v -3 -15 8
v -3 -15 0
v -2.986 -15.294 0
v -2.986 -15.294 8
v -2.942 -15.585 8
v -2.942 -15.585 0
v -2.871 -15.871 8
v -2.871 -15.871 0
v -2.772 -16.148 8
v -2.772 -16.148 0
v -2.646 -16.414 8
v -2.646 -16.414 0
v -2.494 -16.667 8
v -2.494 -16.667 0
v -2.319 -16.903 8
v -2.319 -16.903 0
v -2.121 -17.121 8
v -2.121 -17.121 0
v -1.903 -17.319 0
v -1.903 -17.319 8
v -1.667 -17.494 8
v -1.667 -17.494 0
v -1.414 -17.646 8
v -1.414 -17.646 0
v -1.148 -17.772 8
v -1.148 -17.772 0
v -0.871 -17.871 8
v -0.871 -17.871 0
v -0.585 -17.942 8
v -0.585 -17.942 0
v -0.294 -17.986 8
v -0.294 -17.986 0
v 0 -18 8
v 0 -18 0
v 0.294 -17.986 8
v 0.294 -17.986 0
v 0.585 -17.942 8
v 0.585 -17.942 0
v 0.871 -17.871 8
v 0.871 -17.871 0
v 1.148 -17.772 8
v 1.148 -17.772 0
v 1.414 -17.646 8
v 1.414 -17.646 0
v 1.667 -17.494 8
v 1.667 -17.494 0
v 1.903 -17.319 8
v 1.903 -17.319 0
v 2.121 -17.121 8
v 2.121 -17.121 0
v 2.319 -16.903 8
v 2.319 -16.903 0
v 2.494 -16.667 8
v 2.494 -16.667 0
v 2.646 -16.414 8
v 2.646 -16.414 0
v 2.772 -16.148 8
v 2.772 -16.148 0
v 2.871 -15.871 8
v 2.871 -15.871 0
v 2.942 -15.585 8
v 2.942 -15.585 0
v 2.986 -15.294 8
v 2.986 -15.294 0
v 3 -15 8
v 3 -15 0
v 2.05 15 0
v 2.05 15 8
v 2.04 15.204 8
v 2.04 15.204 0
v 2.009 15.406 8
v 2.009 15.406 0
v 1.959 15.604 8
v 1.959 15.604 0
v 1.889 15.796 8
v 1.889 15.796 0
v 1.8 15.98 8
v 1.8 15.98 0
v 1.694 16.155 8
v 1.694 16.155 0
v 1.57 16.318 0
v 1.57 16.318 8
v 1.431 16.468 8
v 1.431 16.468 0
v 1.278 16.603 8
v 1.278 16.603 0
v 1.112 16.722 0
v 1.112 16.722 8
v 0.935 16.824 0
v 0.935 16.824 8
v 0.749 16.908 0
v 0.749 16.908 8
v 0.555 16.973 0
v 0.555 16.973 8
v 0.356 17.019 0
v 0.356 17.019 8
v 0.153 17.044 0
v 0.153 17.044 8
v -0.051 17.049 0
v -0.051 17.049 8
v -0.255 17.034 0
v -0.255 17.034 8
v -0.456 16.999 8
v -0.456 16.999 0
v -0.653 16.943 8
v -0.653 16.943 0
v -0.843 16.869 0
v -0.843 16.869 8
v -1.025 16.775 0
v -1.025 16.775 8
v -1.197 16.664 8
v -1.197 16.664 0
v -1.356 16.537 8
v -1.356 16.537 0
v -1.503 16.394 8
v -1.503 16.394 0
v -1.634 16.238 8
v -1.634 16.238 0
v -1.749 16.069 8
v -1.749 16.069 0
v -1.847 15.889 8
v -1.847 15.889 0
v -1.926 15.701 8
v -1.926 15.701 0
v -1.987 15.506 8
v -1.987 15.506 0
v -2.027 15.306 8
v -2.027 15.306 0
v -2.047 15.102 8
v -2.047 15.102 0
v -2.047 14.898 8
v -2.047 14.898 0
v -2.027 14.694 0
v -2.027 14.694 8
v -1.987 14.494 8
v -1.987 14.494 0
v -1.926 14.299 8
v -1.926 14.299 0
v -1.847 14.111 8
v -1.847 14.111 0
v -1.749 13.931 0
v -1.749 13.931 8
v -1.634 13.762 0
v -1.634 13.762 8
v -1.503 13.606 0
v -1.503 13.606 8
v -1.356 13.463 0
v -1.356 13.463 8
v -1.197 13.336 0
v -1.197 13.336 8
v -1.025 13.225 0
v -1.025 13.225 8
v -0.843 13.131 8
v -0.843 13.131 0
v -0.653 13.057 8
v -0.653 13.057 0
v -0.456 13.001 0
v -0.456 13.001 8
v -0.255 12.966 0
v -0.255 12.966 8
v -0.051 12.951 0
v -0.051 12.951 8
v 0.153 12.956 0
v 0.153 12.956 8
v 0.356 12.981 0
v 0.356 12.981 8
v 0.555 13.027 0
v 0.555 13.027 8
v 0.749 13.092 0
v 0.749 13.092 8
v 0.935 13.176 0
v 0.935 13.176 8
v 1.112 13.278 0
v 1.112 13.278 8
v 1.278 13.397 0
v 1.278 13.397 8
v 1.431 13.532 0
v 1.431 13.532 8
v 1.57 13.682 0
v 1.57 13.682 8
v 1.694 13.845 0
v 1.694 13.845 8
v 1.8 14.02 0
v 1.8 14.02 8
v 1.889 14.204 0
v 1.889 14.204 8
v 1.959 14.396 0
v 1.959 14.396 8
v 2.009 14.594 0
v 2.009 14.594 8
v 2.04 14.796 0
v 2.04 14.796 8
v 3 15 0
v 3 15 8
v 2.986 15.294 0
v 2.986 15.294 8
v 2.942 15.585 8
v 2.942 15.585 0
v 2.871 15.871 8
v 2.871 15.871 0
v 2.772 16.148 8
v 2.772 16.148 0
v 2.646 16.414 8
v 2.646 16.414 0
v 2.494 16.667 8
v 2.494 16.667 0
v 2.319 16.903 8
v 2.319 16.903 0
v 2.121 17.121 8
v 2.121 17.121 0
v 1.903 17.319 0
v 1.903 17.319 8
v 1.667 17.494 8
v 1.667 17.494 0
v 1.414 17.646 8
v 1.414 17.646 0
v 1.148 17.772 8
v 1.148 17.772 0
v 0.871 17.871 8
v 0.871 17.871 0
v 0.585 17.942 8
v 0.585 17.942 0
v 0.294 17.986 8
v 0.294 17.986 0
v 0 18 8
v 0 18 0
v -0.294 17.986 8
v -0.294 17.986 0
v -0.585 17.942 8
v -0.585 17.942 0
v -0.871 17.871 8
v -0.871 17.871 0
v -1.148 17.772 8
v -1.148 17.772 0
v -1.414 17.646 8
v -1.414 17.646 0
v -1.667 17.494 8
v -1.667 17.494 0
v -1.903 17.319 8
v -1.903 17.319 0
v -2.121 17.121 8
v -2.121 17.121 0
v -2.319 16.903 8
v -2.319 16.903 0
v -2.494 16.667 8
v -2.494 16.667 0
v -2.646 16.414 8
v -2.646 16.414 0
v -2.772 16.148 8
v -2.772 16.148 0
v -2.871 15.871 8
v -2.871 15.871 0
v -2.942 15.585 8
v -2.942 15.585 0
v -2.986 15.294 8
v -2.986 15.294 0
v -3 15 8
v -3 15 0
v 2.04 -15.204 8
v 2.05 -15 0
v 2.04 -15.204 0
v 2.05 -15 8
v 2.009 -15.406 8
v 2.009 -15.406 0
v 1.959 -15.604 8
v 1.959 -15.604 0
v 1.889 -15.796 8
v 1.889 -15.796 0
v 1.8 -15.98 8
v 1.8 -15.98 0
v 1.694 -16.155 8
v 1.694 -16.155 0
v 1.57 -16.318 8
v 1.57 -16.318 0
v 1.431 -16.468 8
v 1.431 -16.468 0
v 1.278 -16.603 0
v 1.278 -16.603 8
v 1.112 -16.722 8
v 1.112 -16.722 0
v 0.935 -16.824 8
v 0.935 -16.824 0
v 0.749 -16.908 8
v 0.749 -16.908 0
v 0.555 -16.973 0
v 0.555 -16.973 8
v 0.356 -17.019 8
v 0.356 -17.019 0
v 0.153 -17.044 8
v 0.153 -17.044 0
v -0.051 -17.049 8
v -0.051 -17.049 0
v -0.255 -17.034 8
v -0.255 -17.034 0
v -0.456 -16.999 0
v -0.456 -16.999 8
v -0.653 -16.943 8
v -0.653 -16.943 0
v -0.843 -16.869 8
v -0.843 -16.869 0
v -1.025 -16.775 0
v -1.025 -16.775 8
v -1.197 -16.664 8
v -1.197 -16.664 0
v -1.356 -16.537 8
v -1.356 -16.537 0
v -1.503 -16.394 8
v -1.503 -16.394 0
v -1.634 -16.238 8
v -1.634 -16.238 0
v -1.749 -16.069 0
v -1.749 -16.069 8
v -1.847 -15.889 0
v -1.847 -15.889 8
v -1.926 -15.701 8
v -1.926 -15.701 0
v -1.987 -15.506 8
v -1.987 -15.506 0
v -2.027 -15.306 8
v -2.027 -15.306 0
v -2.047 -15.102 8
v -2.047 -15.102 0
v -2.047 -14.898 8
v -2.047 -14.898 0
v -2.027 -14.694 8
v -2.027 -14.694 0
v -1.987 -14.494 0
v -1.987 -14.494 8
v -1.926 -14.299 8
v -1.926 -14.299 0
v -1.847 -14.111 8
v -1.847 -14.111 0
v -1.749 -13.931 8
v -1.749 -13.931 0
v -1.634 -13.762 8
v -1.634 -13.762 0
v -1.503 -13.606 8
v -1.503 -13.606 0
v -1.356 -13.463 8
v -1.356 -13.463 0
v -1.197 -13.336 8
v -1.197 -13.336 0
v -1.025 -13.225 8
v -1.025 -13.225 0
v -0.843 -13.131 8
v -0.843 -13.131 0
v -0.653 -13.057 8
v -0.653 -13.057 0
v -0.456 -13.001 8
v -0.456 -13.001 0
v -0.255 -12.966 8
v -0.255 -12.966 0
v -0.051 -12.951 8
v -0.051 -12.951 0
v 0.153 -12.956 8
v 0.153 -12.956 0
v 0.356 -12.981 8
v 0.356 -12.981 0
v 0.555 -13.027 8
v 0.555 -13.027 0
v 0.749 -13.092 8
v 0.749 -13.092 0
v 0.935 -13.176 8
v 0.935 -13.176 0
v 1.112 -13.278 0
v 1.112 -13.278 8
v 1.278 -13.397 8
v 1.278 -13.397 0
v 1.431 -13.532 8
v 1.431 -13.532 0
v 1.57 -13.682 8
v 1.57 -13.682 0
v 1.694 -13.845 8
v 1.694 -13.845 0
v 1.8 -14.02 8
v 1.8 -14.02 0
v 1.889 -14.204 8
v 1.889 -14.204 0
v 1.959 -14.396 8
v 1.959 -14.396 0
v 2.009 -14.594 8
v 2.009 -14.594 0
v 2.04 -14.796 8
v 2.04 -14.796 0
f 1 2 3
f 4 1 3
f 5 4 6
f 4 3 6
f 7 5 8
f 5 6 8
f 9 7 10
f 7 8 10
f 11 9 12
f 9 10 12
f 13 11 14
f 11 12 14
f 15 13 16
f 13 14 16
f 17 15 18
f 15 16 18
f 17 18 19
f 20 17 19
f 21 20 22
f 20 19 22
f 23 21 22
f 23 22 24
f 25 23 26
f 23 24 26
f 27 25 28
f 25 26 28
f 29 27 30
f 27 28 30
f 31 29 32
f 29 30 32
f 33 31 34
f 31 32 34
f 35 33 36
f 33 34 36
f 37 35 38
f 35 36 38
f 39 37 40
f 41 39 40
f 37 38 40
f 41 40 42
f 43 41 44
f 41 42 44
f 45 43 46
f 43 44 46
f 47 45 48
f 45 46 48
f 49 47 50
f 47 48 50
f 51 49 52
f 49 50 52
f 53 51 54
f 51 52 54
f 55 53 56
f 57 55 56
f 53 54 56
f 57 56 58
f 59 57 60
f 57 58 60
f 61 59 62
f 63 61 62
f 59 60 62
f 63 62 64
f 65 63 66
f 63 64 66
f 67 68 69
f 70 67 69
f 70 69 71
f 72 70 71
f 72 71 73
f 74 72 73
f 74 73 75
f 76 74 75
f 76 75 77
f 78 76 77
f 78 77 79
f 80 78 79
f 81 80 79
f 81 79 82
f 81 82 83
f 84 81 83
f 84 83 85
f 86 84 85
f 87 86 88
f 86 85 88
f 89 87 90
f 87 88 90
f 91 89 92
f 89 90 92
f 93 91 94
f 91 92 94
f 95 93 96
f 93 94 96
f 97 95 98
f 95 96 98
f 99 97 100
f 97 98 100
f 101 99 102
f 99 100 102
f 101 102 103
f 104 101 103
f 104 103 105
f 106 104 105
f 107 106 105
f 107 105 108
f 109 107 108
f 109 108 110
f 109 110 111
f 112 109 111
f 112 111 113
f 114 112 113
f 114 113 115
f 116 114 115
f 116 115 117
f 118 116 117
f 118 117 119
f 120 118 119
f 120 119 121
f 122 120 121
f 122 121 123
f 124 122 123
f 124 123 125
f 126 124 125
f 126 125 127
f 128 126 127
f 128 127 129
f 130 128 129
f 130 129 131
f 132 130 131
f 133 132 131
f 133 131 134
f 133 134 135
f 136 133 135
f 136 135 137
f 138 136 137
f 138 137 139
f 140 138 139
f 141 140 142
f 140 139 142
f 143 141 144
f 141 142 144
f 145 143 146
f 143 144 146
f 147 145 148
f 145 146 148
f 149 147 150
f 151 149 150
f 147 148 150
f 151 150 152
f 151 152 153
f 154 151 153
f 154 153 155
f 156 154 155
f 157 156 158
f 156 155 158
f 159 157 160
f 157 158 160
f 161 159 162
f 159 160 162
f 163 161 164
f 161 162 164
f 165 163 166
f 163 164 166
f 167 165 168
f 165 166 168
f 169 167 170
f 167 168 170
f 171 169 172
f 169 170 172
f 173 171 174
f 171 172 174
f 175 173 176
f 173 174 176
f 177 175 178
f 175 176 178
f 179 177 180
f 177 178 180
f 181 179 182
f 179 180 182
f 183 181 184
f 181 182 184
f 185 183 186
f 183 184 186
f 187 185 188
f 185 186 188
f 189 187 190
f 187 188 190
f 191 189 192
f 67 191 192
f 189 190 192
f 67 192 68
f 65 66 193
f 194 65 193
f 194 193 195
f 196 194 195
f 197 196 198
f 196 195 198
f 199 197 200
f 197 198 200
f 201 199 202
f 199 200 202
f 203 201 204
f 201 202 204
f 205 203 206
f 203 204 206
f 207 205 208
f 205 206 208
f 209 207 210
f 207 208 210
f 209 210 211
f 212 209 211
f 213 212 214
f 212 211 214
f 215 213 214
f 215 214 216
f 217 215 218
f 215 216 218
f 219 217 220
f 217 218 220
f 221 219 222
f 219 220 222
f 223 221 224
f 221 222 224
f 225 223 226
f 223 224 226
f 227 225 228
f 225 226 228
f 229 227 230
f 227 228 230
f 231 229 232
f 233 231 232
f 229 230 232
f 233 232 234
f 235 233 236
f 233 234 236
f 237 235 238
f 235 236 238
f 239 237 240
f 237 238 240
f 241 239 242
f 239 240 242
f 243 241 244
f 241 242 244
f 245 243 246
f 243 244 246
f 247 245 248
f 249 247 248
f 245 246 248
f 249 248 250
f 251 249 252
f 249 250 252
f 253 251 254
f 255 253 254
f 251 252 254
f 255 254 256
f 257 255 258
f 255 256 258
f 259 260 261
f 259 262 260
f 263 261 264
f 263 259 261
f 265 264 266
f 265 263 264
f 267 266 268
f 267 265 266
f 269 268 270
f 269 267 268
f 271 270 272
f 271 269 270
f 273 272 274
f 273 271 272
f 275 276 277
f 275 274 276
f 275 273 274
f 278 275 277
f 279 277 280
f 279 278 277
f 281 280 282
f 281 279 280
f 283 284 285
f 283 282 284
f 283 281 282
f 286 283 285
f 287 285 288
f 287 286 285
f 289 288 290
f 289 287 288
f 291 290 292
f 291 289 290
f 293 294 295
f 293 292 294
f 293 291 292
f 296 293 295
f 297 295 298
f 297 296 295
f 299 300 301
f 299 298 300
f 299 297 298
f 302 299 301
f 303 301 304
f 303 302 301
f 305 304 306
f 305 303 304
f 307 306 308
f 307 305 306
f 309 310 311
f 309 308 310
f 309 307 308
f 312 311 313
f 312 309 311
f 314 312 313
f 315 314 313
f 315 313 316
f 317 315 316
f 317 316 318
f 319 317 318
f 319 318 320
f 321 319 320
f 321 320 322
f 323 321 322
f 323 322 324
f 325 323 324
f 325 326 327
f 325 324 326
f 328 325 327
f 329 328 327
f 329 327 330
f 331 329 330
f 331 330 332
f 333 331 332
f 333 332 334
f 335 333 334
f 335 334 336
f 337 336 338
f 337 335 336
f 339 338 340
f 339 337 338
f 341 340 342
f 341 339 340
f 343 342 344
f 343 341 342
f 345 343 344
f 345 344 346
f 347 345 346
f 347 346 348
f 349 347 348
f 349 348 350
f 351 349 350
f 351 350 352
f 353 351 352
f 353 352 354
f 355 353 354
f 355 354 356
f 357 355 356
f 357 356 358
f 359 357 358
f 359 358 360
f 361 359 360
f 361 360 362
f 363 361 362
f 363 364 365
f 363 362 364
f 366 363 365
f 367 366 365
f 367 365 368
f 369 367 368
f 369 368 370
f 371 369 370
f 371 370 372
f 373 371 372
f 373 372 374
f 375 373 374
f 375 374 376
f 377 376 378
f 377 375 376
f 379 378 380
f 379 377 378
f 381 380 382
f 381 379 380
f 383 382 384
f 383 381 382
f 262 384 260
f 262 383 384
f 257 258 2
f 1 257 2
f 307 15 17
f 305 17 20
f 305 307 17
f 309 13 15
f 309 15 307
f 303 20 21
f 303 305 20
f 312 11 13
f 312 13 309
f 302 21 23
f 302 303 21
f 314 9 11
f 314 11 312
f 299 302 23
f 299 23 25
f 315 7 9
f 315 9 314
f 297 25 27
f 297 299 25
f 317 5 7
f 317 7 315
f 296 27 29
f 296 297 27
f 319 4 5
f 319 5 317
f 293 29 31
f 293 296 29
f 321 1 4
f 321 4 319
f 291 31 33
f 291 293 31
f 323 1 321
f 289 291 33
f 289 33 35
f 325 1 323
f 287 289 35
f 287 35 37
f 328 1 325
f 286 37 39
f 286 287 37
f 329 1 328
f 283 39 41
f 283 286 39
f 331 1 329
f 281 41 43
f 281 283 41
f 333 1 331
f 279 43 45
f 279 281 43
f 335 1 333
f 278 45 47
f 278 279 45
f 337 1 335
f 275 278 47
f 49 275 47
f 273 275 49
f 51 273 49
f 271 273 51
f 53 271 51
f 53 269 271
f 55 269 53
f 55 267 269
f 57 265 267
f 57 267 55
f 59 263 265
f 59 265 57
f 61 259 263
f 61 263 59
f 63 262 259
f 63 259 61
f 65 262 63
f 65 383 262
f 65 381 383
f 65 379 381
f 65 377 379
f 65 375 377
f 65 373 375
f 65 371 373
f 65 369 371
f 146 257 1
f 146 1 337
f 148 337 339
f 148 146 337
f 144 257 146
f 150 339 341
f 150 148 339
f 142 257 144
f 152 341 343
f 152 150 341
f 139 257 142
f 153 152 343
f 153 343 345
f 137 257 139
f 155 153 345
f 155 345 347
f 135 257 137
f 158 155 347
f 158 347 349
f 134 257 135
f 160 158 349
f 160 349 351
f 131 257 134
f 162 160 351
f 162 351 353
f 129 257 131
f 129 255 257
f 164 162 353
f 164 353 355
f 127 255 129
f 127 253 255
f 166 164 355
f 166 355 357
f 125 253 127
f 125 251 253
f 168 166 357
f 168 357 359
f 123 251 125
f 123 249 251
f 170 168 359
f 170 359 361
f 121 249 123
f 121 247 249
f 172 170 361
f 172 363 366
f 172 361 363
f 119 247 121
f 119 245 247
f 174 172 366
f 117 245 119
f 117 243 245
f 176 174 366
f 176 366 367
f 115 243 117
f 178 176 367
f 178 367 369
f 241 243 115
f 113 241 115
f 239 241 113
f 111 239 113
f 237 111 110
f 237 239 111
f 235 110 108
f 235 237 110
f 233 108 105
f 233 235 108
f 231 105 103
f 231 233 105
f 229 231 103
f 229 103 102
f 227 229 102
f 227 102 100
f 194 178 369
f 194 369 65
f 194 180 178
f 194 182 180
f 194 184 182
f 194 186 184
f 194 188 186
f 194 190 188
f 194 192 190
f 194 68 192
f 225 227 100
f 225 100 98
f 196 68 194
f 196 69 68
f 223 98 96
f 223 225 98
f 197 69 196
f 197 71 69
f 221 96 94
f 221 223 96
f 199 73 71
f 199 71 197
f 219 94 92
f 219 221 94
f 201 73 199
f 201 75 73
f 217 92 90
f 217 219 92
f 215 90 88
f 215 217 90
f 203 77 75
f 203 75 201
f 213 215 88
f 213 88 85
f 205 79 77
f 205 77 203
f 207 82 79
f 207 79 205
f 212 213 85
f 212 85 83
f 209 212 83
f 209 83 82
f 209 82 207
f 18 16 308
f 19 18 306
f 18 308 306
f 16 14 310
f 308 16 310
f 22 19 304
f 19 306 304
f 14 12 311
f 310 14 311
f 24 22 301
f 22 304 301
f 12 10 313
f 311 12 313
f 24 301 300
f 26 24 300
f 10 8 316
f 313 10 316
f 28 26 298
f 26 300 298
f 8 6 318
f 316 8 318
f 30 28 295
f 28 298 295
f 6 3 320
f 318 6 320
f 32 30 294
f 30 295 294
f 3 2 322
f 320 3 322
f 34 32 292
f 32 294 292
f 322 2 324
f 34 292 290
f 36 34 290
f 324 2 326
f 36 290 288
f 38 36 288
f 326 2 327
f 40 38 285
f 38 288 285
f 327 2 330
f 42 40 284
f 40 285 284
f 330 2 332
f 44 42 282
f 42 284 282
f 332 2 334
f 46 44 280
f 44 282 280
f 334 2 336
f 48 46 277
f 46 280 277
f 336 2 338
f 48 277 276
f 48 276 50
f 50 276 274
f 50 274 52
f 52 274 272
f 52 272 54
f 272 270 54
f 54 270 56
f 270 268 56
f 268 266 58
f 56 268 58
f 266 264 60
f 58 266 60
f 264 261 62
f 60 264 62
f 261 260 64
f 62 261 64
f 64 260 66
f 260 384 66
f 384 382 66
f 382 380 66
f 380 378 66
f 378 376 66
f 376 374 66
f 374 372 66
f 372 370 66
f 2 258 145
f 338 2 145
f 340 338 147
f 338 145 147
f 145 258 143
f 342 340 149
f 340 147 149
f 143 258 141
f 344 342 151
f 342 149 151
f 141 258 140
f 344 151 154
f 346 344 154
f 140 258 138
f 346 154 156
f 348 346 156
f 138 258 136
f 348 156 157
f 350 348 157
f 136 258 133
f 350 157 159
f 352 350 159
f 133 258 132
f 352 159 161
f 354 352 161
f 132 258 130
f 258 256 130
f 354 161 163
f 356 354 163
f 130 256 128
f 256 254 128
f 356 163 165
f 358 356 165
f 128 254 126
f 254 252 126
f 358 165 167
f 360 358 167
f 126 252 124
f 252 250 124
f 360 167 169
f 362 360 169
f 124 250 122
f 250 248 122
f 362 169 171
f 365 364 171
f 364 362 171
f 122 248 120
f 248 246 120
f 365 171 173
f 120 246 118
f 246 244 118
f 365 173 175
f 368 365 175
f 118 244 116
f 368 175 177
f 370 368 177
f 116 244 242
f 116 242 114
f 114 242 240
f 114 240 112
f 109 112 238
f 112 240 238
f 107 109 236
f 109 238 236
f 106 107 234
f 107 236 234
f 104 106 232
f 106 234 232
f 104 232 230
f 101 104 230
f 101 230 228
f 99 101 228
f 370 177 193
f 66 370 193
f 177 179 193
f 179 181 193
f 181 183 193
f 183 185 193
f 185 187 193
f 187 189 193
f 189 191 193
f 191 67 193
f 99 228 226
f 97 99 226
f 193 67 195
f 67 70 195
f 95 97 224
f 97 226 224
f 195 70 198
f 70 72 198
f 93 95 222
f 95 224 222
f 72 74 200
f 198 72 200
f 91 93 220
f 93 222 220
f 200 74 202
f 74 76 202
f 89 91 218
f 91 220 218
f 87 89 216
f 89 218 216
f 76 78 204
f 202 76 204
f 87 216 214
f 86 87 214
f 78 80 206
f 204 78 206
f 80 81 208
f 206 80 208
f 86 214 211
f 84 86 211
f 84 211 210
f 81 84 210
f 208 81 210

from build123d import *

# Parameters (mm, degrees)
BOSS_EXTRUDE1_DEPTH     = 8
F_4_0_MM_DOWEL_HOLES1_D = 4.1


with BuildPart() as part:
    # Sketch1 → Boss-Extrude1 (new body)
    with BuildSketch(Plane.XY):
        with BuildLine():
            Line((-3, 15), (-3, -15))
            ThreePointArc((-3, -15), (0, -18), (3, -15))
            Line((3, -15), (3, 15))
            ThreePointArc((3, 15), (0, 18), (-3, 15))
        make_face()
    extrude(amount=BOSS_EXTRUDE1_DEPTH)

    # Ø4.0 mm Dowel Holes1 (through all)
    with Locations(Plane(origin=(0, 0, 0), x_dir=(-1, 0, 0), z_dir=(0, 0, -1))):
        with Locations((0, 15)):
            f_4_0_mm_dowel_holes1 = Hole(F_4_0_MM_DOWEL_HOLES1_D / 2)

    # Mirror1: Ø4.0 mm Dowel Holes1 across plane
    add(f_4_0_mm_dowel_holes1.mirror(Plane.ZX), mode=Mode.SUBTRACT)


solid = part.part
